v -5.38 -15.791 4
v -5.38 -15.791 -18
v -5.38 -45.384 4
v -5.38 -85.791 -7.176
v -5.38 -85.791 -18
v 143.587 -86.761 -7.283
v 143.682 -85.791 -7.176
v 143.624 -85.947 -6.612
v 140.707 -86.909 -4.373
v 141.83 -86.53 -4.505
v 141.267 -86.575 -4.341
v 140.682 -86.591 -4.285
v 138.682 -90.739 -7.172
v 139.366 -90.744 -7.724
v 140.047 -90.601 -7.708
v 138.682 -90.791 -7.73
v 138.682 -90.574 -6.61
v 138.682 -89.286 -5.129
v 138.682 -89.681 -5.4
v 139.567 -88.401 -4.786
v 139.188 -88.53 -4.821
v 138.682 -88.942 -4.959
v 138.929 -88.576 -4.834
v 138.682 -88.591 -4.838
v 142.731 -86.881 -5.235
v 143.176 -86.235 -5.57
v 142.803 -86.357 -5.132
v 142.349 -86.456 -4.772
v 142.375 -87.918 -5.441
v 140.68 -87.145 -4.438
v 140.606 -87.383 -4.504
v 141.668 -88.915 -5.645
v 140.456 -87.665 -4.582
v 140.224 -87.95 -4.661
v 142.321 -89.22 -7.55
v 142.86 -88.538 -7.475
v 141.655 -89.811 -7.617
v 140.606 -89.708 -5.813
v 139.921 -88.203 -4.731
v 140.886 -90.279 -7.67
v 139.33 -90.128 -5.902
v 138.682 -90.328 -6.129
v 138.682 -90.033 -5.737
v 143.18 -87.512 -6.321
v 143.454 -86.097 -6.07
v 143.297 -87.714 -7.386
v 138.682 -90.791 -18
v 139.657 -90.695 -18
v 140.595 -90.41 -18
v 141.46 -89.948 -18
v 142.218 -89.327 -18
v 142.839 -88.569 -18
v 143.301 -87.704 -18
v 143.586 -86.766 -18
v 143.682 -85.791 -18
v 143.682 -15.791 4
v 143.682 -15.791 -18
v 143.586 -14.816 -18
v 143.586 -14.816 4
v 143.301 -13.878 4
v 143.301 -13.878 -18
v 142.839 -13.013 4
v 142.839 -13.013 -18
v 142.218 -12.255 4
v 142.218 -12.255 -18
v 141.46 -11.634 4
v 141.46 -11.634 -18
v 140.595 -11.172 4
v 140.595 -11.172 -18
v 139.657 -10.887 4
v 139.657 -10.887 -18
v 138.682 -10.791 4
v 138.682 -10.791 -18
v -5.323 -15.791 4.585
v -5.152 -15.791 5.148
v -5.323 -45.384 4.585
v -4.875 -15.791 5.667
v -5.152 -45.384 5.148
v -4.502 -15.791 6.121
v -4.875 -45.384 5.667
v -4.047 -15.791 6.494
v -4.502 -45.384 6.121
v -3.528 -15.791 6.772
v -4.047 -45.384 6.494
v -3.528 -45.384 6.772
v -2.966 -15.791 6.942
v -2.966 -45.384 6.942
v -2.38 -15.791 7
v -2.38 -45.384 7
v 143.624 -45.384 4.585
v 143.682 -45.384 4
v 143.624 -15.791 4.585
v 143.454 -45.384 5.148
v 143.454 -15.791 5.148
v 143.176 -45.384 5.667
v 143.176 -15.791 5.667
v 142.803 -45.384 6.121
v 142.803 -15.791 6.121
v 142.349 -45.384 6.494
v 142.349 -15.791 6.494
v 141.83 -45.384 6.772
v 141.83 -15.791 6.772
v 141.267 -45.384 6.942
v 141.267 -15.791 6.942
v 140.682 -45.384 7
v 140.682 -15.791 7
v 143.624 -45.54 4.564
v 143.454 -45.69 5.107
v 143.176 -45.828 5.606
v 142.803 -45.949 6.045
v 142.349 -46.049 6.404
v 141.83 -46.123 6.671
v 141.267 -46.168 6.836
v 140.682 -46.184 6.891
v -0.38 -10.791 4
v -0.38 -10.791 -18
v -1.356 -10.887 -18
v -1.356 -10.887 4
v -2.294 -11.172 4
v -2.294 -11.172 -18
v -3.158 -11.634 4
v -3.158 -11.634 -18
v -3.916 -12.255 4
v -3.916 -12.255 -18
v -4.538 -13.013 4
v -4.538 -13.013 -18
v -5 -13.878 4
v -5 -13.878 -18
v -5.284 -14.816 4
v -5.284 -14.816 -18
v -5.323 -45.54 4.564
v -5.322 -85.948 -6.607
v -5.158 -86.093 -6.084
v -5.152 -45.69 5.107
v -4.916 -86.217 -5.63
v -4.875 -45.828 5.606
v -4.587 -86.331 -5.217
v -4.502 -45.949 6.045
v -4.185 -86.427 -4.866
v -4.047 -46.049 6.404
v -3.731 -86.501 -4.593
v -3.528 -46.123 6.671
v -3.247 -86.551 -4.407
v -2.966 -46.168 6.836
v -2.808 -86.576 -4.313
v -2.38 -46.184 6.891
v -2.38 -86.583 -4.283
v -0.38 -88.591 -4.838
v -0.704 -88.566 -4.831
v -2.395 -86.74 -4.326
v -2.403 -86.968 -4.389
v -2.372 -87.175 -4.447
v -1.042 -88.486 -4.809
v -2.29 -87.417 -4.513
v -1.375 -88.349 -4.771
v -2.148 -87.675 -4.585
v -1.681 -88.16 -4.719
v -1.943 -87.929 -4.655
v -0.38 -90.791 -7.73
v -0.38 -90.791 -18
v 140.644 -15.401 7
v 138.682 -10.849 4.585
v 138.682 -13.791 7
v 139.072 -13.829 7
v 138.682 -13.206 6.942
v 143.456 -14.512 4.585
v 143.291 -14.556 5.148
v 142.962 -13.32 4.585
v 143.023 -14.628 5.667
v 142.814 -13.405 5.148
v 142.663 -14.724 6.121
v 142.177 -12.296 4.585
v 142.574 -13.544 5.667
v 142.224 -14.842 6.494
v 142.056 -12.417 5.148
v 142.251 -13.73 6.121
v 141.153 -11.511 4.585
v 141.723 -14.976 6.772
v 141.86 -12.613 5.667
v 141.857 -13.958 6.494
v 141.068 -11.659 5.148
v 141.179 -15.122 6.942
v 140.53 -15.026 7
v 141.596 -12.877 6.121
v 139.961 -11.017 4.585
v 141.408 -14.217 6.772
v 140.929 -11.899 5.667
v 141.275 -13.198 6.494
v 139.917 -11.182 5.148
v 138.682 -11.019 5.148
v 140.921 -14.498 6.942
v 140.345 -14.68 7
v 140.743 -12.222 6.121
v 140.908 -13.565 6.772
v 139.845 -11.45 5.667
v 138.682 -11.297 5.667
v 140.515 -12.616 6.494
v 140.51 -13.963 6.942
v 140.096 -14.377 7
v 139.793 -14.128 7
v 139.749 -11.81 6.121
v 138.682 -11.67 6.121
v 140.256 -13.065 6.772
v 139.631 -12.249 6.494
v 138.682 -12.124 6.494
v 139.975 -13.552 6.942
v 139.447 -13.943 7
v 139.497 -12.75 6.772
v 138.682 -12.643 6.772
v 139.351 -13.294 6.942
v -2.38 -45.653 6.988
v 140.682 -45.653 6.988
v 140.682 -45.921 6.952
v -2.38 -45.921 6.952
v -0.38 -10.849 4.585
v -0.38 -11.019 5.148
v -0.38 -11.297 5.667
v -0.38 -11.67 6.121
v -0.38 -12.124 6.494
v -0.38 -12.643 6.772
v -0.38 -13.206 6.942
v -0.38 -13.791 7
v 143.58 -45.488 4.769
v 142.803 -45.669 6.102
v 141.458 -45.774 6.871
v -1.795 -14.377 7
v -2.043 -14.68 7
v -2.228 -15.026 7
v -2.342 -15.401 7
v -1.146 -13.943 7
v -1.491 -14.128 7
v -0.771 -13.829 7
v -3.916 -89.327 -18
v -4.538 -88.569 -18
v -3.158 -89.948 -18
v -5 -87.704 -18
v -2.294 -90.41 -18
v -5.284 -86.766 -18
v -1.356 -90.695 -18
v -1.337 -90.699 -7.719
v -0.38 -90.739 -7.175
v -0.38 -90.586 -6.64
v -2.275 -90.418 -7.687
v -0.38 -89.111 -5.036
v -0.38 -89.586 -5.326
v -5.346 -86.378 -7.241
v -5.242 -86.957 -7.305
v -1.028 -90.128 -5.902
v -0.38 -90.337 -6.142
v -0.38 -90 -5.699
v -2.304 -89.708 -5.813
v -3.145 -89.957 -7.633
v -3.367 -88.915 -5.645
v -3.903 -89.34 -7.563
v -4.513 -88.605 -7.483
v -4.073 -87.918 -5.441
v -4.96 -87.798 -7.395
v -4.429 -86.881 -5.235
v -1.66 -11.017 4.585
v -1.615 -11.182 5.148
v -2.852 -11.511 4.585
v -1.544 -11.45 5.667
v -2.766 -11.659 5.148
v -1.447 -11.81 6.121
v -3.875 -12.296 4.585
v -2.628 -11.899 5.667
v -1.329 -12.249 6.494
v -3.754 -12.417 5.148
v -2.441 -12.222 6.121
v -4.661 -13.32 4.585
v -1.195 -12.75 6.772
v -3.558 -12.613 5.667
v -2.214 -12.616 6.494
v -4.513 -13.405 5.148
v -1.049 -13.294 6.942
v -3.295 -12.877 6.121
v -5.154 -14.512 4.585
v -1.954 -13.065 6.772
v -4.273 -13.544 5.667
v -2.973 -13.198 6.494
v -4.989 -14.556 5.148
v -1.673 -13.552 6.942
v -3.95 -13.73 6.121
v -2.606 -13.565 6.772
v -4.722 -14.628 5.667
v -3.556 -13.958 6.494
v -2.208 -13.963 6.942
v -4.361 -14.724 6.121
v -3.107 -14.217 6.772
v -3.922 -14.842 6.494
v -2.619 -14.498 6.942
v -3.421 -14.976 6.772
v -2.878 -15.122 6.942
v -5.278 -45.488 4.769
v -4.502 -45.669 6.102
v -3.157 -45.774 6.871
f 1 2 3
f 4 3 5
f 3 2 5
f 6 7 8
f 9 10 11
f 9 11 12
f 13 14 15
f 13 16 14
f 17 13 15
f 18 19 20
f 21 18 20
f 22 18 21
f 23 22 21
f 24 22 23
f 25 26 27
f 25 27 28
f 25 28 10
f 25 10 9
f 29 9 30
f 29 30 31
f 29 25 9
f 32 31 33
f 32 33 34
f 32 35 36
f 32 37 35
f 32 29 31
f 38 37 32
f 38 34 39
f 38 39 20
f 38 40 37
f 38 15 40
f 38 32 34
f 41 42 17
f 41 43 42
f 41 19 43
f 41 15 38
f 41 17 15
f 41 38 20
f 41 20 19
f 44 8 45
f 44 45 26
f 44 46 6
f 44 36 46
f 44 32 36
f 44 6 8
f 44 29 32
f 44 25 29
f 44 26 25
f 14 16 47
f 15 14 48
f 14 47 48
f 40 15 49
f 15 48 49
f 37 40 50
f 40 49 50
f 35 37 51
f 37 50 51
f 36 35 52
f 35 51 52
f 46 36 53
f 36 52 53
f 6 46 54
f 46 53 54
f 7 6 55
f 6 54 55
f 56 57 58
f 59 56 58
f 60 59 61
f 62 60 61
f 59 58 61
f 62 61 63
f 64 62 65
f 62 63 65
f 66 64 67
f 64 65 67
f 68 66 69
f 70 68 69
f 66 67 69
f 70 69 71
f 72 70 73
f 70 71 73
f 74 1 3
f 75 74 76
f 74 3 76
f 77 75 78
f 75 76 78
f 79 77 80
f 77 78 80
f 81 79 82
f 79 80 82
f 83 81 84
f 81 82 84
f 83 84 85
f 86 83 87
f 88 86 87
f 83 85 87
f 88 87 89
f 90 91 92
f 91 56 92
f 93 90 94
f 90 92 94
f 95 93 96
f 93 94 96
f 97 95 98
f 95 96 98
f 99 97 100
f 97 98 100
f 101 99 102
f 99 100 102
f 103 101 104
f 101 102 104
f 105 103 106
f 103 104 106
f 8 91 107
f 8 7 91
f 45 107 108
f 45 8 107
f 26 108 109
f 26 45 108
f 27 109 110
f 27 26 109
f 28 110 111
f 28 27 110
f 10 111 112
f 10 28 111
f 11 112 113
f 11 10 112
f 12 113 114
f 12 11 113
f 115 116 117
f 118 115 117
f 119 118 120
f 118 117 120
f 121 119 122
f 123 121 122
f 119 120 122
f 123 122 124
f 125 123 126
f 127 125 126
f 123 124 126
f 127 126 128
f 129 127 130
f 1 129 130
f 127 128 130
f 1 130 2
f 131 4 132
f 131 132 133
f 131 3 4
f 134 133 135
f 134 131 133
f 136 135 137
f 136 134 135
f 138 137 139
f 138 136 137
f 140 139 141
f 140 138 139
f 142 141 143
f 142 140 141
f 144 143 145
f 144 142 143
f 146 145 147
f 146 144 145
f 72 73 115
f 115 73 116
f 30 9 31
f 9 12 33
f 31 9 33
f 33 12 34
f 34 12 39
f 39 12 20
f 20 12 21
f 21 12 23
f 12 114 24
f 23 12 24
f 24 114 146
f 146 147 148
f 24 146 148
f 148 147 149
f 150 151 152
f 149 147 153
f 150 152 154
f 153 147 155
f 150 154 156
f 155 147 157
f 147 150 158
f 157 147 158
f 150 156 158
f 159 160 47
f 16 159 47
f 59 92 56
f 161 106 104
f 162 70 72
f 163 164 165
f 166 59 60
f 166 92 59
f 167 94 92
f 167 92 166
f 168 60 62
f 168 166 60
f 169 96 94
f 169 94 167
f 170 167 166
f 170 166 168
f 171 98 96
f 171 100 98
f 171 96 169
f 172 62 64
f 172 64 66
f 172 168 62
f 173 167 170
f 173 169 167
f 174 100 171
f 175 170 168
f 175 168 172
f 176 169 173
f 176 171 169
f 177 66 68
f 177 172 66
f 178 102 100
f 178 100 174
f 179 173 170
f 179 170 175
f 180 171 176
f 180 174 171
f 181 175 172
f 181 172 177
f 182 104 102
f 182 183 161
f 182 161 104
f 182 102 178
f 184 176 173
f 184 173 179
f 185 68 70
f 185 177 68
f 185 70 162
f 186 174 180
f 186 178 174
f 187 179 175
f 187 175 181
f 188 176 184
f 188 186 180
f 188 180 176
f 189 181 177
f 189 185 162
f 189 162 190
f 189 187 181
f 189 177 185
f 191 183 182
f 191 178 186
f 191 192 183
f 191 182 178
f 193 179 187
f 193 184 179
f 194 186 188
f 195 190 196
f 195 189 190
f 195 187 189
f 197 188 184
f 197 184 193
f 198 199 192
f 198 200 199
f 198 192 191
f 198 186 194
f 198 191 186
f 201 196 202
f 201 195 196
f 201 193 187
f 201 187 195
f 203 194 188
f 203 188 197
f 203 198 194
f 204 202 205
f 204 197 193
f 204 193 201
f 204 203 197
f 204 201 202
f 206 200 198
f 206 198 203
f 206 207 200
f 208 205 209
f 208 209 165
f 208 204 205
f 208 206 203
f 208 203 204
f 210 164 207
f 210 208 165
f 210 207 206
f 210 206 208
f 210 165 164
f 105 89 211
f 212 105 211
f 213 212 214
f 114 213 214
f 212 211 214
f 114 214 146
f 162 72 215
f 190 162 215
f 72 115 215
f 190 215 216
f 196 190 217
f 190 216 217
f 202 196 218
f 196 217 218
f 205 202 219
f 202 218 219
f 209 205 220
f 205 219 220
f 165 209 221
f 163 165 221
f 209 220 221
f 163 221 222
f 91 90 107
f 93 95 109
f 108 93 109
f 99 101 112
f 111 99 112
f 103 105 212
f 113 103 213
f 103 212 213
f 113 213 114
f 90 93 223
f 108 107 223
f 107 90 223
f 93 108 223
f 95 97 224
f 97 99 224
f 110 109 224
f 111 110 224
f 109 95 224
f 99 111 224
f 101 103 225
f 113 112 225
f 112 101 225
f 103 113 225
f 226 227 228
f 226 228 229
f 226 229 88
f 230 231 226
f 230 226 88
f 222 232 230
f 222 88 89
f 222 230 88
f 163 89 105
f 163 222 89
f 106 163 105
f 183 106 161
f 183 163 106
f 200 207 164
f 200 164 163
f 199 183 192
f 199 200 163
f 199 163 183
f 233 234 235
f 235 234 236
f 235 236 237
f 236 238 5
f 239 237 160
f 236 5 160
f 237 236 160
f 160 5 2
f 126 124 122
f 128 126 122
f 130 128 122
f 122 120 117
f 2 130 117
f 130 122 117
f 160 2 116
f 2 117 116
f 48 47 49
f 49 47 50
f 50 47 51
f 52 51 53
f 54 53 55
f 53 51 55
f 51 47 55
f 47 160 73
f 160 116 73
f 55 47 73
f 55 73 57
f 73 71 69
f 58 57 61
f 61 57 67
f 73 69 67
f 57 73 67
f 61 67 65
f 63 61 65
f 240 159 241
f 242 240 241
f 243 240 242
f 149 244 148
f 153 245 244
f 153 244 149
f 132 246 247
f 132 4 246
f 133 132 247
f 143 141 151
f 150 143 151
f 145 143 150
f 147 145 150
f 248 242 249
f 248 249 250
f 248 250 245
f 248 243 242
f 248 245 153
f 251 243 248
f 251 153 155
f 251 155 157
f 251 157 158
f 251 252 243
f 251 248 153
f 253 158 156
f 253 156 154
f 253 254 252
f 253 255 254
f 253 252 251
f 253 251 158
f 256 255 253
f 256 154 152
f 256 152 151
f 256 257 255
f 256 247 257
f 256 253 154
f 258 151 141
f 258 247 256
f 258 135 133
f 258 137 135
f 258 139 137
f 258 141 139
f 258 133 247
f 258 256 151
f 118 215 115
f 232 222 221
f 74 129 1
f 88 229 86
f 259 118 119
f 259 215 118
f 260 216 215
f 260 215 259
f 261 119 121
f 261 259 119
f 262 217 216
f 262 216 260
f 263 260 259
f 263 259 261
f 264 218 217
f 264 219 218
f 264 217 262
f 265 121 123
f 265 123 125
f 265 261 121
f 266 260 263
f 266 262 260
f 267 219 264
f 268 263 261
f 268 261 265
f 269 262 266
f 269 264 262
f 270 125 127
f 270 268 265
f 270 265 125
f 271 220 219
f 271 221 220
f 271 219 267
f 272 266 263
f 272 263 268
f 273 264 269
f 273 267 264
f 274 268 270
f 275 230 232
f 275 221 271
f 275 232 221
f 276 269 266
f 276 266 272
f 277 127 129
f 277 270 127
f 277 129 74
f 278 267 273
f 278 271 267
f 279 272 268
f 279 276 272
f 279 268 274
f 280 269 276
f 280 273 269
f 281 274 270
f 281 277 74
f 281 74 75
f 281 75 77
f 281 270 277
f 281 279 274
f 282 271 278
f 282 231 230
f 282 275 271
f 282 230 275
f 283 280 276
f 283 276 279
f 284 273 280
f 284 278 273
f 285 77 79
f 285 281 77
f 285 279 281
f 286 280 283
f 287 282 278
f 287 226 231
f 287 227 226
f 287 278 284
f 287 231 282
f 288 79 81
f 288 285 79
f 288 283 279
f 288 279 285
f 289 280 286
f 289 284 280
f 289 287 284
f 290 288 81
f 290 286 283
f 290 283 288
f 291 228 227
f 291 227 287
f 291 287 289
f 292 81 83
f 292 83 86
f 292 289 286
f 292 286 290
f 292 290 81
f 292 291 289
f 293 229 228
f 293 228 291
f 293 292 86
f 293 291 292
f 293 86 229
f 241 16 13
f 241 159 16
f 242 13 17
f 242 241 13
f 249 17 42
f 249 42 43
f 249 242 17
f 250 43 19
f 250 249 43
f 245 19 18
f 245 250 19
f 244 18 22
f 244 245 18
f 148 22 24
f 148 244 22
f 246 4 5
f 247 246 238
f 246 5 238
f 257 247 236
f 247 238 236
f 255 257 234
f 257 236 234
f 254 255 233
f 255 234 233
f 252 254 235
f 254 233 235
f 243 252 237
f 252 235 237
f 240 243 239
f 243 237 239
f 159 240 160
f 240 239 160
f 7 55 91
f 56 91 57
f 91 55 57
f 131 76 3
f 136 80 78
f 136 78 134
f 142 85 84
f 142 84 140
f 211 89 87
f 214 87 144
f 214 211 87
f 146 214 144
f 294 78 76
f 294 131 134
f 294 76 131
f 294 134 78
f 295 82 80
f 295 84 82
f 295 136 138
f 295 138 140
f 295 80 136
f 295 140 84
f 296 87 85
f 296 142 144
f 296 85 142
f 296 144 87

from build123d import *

# Parameters (mm, degrees)
LEFT_PALM_PAD_DEPTH        = 25
LEFT_PALM_WEDGE_DEPTH      = 5.38135
LEFT_PALM_WEDGE_DEPTH_BACK = 143.683
LEFT_PALM_FILLET_R         = 3


with BuildPart() as part:
    # Left_Palm_Base → Left_Palm_Pad (new body)
    with BuildSketch(Plane.XY.offset(-18)):
        with BuildLine():
            Line((-0.38035, -90.791), (138.682, -90.791))
            ThreePointArc((138.682, -90.791), (142.217534, -89.326534), (143.682, -85.791))
            Line((143.682, -85.791), (143.682, -15.791))
            ThreePointArc((143.682, -15.791), (142.217534, -12.255466), (138.682, -10.791))
            Line((138.682, -10.791), (-0.38035, -10.791))
            ThreePointArc((-0.38035, -10.791), (-3.915884, -12.255466), (-5.38035, -15.791))
            Line((-5.38035, -15.791), (-5.38035, -85.791))
            ThreePointArc((-5.38035, -85.791), (-3.915884, -89.326534), (-0.38035, -90.791))
        make_face()
    extrude(amount=LEFT_PALM_PAD_DEPTH)

    # Left_Palm_WedgeCut → Left_Palm_Wedge (cut, two sides)
    with BuildSketch(Plane.YZ) as left_palm_wedge_sk:
        Polygon((-45.791, 7), (-92.791, -6), (-92.791, 9), (-45.791, 9), align=None)
    extrude(amount=-LEFT_PALM_WEDGE_DEPTH, mode=Mode.SUBTRACT)
    extrude(left_palm_wedge_sk.sketch, amount=LEFT_PALM_WEDGE_DEPTH_BACK, mode=Mode.SUBTRACT)

    # Left_Palm_Fillet
    left_palm_fillet_edges = [part.edges().sort_by_distance(p)[0] for p in [
        (69.150825, -90.791, -5.446809),
        (142.249947, -89.293821, -5.032695),
        (69.150825, -45.791, 7),
        (-5.38035, -65.791, 1.468085),
        (-3.948297, -89.293821, -5.032695),
        (143.682, -65.791, 1.468085),
        (143.682, -30.791, 7),
        (142.217534, -12.255466, 7),
        (69.150825, -10.791, 7),
        (-3.915884, -12.255466, 7),
        (-5.38035, -30.791, 7),
    ]]
    fillet(left_palm_fillet_edges, radius=LEFT_PALM_FILLET_R)


solid = part.part
